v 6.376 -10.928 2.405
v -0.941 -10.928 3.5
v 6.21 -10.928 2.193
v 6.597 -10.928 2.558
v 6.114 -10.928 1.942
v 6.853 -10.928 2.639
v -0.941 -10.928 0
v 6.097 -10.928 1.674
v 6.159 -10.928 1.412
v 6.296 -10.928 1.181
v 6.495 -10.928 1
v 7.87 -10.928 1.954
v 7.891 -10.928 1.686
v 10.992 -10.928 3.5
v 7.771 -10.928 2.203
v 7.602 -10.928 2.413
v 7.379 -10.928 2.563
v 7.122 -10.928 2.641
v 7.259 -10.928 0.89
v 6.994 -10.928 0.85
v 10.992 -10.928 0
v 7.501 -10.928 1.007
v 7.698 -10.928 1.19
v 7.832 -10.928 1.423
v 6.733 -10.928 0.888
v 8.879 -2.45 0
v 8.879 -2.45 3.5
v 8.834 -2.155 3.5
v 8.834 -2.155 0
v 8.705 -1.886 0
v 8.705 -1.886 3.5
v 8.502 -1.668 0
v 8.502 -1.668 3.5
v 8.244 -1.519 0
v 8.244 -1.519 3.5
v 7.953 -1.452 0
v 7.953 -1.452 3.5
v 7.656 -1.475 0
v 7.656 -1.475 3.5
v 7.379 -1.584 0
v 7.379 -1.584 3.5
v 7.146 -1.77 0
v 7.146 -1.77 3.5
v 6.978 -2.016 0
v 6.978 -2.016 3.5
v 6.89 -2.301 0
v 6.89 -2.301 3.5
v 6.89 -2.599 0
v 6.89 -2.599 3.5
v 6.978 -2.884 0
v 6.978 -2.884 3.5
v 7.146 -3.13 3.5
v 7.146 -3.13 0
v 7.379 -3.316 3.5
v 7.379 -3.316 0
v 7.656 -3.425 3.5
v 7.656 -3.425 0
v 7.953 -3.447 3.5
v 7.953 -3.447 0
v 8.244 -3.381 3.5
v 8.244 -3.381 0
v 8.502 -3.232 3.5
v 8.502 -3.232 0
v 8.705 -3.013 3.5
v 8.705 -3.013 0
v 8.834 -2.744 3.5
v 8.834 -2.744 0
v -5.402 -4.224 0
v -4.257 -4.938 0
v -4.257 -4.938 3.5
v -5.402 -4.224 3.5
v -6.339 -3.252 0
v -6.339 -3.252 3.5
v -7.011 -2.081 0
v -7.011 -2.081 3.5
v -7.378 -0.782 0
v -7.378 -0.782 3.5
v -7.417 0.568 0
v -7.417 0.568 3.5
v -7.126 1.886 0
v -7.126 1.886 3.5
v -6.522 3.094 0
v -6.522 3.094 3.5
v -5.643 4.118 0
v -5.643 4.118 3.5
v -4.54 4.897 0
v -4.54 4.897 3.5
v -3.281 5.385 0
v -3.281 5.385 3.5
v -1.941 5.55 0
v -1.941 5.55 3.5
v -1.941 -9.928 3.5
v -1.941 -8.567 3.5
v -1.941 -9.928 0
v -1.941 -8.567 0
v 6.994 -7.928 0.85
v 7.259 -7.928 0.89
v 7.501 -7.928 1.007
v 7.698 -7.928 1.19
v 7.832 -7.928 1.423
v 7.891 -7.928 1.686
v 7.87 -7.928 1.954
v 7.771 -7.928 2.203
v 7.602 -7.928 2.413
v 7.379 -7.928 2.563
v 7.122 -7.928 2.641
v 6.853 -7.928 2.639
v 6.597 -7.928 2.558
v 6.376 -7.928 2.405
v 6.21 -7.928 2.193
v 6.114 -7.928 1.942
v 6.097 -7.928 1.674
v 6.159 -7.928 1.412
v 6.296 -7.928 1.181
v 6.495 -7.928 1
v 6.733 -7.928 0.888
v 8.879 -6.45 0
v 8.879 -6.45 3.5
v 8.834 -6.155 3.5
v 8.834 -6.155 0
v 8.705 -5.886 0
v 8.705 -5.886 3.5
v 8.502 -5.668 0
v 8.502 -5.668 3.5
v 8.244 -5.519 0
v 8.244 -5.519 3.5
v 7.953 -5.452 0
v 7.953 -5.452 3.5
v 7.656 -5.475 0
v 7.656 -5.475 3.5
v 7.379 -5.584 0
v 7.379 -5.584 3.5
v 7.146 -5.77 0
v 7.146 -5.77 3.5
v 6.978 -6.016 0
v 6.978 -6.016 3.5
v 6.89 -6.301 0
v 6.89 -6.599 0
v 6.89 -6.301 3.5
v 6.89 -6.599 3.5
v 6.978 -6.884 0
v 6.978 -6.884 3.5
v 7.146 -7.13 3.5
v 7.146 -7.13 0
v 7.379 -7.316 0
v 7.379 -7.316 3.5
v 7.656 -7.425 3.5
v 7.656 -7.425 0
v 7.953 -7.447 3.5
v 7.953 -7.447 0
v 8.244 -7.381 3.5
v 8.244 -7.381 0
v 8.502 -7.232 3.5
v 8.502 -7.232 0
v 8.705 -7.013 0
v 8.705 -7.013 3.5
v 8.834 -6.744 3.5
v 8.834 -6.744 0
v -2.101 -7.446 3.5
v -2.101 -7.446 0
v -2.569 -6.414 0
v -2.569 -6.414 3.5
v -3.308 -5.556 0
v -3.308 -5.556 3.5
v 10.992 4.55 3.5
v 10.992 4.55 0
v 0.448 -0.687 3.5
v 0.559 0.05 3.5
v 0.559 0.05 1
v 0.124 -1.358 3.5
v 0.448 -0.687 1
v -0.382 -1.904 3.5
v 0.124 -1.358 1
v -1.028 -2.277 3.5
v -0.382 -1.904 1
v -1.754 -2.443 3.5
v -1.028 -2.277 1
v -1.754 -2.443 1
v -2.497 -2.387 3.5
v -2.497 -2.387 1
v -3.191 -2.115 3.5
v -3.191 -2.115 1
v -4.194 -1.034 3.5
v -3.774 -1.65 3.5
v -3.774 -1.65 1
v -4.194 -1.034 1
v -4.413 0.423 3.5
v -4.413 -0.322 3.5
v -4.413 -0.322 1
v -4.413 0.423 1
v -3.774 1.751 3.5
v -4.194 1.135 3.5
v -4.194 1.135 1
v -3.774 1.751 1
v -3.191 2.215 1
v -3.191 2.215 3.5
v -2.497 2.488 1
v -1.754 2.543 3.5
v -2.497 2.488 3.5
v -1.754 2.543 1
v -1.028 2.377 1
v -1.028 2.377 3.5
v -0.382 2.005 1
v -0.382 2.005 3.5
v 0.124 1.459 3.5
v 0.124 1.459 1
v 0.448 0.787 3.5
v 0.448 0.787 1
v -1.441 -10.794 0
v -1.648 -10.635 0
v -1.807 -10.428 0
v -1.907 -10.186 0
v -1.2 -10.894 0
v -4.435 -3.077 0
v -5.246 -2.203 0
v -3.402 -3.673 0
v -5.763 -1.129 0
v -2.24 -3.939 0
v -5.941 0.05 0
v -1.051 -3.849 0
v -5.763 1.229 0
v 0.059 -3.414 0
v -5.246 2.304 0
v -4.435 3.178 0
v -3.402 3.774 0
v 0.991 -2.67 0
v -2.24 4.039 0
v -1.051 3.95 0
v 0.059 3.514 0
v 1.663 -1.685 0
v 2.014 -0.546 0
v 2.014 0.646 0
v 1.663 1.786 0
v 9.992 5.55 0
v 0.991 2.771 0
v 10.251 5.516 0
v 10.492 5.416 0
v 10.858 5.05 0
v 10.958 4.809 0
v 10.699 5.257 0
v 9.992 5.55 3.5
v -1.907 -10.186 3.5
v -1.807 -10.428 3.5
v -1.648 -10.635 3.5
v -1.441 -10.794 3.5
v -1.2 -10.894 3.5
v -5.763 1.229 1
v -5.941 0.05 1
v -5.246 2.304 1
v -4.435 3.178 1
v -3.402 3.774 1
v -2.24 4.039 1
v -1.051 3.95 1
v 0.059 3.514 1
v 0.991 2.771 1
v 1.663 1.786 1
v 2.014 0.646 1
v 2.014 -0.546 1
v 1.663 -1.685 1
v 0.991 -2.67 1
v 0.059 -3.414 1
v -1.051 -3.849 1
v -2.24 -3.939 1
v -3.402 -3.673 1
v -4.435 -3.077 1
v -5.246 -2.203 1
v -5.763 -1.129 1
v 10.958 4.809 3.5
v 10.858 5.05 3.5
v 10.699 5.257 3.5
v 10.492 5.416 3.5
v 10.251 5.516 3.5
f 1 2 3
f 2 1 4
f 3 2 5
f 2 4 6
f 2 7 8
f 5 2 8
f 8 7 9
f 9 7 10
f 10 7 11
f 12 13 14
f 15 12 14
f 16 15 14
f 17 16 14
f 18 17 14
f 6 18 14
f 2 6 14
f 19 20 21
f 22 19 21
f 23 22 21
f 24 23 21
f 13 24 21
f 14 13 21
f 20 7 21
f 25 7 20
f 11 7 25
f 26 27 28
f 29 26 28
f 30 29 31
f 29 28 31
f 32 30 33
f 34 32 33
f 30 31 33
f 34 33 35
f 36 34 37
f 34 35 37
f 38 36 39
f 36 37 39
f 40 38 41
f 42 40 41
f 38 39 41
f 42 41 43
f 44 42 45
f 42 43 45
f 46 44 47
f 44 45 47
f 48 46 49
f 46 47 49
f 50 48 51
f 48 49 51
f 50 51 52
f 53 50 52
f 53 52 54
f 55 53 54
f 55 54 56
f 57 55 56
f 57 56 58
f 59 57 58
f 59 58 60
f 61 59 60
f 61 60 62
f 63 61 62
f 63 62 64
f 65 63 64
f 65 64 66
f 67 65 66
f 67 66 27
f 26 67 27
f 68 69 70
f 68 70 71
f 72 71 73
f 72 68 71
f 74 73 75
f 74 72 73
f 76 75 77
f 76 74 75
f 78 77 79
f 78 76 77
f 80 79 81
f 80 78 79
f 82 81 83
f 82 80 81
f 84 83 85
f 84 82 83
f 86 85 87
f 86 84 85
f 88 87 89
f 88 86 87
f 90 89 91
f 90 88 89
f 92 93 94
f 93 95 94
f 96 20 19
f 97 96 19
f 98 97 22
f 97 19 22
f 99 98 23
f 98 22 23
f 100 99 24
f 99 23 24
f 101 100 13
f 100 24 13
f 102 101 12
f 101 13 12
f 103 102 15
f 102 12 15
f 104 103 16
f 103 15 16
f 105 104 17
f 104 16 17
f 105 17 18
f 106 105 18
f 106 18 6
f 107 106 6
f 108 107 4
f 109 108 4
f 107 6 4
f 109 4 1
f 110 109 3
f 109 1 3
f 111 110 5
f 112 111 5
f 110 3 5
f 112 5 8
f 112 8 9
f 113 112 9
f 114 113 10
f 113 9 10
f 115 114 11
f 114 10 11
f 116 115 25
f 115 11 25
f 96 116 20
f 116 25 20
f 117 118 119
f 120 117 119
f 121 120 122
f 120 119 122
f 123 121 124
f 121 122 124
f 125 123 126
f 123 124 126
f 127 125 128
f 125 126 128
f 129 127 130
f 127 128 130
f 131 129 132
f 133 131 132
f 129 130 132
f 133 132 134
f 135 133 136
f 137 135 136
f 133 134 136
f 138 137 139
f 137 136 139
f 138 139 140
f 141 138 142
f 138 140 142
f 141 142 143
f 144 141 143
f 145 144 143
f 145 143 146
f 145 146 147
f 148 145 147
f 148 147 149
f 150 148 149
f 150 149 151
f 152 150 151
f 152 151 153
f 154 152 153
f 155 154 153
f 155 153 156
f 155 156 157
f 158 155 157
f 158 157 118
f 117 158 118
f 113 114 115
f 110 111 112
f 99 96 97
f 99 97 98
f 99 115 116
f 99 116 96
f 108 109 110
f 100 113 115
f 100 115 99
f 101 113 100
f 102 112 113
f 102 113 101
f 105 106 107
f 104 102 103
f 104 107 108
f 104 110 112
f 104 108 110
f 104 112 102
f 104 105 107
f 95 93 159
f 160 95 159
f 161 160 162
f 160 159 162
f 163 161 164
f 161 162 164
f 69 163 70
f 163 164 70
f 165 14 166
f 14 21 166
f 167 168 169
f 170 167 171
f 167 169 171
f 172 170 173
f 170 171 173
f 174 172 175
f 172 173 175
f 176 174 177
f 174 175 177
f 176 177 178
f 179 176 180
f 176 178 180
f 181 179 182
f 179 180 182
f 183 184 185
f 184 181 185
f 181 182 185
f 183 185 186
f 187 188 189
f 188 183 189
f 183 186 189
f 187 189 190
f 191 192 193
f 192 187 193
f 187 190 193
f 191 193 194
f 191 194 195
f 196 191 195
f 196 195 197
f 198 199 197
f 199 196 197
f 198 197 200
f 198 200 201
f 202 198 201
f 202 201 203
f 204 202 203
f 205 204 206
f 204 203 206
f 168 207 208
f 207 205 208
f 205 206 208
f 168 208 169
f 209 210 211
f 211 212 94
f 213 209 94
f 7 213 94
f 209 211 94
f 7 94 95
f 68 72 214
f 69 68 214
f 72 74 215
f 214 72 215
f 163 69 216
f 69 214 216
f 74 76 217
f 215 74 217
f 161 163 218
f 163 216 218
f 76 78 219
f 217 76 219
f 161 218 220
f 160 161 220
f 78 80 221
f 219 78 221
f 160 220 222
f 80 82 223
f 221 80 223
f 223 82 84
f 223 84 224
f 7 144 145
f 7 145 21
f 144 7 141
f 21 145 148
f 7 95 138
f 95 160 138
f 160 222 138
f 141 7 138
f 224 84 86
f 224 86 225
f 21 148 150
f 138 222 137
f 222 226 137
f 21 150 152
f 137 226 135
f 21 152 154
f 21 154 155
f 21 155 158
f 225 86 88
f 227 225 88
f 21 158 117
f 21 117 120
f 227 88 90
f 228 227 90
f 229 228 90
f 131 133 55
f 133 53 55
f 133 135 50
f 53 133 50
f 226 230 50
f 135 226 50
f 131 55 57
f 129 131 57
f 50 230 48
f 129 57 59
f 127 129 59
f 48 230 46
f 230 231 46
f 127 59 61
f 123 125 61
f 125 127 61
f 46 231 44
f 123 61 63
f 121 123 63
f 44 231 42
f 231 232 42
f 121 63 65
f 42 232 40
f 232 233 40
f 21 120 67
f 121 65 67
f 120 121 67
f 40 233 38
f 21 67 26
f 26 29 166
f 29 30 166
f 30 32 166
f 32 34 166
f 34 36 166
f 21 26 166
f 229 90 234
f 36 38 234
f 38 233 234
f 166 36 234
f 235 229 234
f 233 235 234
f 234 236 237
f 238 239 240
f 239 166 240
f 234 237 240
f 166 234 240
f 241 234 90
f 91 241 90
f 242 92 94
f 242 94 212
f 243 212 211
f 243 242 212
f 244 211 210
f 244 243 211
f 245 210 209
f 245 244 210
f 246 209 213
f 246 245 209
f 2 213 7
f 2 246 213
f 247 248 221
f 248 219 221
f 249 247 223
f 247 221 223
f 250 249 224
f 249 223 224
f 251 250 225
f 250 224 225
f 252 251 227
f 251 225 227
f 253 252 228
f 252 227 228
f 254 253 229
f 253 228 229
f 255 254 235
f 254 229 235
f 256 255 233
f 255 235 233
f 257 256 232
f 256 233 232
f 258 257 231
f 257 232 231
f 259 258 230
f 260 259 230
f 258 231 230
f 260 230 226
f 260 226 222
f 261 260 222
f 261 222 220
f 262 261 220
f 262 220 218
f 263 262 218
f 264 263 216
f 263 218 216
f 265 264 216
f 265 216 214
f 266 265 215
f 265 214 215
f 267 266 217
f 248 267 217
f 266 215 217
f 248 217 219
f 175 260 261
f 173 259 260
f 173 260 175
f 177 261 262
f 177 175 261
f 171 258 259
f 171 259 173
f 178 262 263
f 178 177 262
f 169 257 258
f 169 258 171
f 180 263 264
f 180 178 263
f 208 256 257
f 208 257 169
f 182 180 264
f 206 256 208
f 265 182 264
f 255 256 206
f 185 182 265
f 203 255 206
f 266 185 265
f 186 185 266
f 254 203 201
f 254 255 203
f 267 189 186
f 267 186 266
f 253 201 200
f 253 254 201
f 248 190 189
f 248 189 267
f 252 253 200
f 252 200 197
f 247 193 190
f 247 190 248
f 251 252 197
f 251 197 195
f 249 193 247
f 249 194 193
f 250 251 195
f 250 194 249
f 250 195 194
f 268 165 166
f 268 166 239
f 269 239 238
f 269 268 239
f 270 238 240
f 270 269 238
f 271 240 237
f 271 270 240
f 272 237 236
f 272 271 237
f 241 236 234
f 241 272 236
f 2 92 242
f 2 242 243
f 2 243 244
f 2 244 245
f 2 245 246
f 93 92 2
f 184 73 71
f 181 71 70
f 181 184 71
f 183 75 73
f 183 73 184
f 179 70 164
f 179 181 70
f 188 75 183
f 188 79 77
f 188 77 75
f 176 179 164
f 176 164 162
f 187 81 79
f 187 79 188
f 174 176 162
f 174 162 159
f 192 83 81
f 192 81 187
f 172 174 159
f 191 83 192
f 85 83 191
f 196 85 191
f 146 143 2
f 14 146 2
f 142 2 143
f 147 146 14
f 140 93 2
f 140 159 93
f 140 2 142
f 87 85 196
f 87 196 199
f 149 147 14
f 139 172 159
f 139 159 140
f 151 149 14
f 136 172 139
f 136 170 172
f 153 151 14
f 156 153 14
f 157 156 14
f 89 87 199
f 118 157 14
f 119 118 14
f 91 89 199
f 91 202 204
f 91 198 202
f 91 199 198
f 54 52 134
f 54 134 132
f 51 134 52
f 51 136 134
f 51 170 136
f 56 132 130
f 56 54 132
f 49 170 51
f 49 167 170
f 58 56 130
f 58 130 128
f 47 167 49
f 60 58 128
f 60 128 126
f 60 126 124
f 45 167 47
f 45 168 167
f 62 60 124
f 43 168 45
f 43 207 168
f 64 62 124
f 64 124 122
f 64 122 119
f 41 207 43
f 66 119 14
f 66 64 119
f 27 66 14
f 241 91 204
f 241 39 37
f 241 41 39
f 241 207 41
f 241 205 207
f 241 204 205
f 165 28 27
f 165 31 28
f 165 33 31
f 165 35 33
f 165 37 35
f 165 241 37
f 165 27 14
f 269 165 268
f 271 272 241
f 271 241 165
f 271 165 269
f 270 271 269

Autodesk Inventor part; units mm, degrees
ref_plane "YZ Plane" through (0, 0, 0) normal (1, 0, 0) x (0, 1, 0)
ref_plane "XZ Plane" through (0, 0, 0) normal (0, 1, 0) x (-1, 0, 0)
ref_plane "XY Plane" through (0, 0, 0) normal (0, 0, 1) x (1, 0, 0)
sketch "草图1" plane through (0, 0, 0) normal (0, 0, 1) x (1, 0, 0)
  circle A0 centre (-1.9411, 0.0503) radius 2.5
  line L0 (4.3454, -10.9196) -> (9.6453, -10.9355) projected
  circle A1 centre (-1.9411, 0.0503) radius 5.5
  line L1 (-1.9411, -10.9276) -> (10.9921, -10.9276)
  line L2 (10.9921, -10.9276) -> (10.9921, 5.5503)
  line L3 (10.9921, 5.5503) -> (-1.9411, 5.5503)
  line L4 (-1.9411, 5.5503) -> (-1.9411, -10.9276)
  point P0 (6.9953, -10.9276)
  point P1 (-1.9411, 5.5503)
  point P2 (-1.9411, -5.4497)
  dimension "d3" = 3
  dimension "d5" = 5
extrude "拉伸1" add sketch "草图1" along normal blind 3.5 contours A0 L4 A1 | A0 L4 A1 | L3 L2 L1 L4 A1
fillet "圆角1" radius 4 1 edges at (-1.9411, -5.4497, 1.75)
sketch "草图2" plane through (0, 0, 0) normal (0, 0, -1) x (-1, 0, 0)
  point P0 (0, 0)
sketch "草图3" plane through (0, 0, 0) normal (0, 0, -1) x (-1, 0, 0)
  circle A0 centre (1.9411, 0.0503) radius 2.5 projected
  circle A1 centre (1.9411, 0.0503) radius 4
  point P0 (0, 0)
  dimension "d6" = 8
extrude "拉伸2" cut sketch "草图3" against normal blind 1 contours A0 | A1
sketch "草图4" plane through (-1.9411, -10.9276, 0) normal (0, -1, 0) x (1, 0, 0)
  ellipse E0 centre (8.9346, 1.75) end of major axis (8.9346, 0.85) minor radius 0.9 projected
  point P0 (1.9411, 0)
extrude "拉伸3" cut sketch "草图4" against normal blind 3
fillet "圆角2" radius 1 2 edges at (10.9921, 5.5503, 1.75) (-1.9411, -10.9276, 1.75)
sketch "草图5" plane through (0, 0, 3.5) normal (0, 0, 1) x (1, 0, 0)
  line L0 (15.1126, -4.4497) -> (15.1126, -8.4497) projected
  line L1 (5.3617, -4.4497) -> (15.1126, -4.4497) projected
  line L2 (5.3617, -8.4497) -> (5.3617, -4.4497) projected
  line L3 (5.3617, -8.4497) -> (15.1126, -8.4497) projected
  line L4 (5.3617, -6.4497) -> (10.3955, -6.4497)
  circle A0 centre (7.8786, -6.4497) radius 1
  circle A1 centre (7.8786, -6.4497) radius 1 projected
  point P0 (0, 0)
  dimension "d12" = 2
extrude "拉伸4" cut sketch "草图5" against normal blind 5.5 contours A0 L4 | L4 A0
sketch "草图6" plane through (0, 0, 3.5) normal (0, 0, 1) x (1, 0, 0)
  circle A0 centre (7.8786, -2.4497) radius 1 projected
  point P0 (0, 0)
extrude "拉伸5" cut sketch "草图6" against normal blind 10
properties part number "针头装配体"
